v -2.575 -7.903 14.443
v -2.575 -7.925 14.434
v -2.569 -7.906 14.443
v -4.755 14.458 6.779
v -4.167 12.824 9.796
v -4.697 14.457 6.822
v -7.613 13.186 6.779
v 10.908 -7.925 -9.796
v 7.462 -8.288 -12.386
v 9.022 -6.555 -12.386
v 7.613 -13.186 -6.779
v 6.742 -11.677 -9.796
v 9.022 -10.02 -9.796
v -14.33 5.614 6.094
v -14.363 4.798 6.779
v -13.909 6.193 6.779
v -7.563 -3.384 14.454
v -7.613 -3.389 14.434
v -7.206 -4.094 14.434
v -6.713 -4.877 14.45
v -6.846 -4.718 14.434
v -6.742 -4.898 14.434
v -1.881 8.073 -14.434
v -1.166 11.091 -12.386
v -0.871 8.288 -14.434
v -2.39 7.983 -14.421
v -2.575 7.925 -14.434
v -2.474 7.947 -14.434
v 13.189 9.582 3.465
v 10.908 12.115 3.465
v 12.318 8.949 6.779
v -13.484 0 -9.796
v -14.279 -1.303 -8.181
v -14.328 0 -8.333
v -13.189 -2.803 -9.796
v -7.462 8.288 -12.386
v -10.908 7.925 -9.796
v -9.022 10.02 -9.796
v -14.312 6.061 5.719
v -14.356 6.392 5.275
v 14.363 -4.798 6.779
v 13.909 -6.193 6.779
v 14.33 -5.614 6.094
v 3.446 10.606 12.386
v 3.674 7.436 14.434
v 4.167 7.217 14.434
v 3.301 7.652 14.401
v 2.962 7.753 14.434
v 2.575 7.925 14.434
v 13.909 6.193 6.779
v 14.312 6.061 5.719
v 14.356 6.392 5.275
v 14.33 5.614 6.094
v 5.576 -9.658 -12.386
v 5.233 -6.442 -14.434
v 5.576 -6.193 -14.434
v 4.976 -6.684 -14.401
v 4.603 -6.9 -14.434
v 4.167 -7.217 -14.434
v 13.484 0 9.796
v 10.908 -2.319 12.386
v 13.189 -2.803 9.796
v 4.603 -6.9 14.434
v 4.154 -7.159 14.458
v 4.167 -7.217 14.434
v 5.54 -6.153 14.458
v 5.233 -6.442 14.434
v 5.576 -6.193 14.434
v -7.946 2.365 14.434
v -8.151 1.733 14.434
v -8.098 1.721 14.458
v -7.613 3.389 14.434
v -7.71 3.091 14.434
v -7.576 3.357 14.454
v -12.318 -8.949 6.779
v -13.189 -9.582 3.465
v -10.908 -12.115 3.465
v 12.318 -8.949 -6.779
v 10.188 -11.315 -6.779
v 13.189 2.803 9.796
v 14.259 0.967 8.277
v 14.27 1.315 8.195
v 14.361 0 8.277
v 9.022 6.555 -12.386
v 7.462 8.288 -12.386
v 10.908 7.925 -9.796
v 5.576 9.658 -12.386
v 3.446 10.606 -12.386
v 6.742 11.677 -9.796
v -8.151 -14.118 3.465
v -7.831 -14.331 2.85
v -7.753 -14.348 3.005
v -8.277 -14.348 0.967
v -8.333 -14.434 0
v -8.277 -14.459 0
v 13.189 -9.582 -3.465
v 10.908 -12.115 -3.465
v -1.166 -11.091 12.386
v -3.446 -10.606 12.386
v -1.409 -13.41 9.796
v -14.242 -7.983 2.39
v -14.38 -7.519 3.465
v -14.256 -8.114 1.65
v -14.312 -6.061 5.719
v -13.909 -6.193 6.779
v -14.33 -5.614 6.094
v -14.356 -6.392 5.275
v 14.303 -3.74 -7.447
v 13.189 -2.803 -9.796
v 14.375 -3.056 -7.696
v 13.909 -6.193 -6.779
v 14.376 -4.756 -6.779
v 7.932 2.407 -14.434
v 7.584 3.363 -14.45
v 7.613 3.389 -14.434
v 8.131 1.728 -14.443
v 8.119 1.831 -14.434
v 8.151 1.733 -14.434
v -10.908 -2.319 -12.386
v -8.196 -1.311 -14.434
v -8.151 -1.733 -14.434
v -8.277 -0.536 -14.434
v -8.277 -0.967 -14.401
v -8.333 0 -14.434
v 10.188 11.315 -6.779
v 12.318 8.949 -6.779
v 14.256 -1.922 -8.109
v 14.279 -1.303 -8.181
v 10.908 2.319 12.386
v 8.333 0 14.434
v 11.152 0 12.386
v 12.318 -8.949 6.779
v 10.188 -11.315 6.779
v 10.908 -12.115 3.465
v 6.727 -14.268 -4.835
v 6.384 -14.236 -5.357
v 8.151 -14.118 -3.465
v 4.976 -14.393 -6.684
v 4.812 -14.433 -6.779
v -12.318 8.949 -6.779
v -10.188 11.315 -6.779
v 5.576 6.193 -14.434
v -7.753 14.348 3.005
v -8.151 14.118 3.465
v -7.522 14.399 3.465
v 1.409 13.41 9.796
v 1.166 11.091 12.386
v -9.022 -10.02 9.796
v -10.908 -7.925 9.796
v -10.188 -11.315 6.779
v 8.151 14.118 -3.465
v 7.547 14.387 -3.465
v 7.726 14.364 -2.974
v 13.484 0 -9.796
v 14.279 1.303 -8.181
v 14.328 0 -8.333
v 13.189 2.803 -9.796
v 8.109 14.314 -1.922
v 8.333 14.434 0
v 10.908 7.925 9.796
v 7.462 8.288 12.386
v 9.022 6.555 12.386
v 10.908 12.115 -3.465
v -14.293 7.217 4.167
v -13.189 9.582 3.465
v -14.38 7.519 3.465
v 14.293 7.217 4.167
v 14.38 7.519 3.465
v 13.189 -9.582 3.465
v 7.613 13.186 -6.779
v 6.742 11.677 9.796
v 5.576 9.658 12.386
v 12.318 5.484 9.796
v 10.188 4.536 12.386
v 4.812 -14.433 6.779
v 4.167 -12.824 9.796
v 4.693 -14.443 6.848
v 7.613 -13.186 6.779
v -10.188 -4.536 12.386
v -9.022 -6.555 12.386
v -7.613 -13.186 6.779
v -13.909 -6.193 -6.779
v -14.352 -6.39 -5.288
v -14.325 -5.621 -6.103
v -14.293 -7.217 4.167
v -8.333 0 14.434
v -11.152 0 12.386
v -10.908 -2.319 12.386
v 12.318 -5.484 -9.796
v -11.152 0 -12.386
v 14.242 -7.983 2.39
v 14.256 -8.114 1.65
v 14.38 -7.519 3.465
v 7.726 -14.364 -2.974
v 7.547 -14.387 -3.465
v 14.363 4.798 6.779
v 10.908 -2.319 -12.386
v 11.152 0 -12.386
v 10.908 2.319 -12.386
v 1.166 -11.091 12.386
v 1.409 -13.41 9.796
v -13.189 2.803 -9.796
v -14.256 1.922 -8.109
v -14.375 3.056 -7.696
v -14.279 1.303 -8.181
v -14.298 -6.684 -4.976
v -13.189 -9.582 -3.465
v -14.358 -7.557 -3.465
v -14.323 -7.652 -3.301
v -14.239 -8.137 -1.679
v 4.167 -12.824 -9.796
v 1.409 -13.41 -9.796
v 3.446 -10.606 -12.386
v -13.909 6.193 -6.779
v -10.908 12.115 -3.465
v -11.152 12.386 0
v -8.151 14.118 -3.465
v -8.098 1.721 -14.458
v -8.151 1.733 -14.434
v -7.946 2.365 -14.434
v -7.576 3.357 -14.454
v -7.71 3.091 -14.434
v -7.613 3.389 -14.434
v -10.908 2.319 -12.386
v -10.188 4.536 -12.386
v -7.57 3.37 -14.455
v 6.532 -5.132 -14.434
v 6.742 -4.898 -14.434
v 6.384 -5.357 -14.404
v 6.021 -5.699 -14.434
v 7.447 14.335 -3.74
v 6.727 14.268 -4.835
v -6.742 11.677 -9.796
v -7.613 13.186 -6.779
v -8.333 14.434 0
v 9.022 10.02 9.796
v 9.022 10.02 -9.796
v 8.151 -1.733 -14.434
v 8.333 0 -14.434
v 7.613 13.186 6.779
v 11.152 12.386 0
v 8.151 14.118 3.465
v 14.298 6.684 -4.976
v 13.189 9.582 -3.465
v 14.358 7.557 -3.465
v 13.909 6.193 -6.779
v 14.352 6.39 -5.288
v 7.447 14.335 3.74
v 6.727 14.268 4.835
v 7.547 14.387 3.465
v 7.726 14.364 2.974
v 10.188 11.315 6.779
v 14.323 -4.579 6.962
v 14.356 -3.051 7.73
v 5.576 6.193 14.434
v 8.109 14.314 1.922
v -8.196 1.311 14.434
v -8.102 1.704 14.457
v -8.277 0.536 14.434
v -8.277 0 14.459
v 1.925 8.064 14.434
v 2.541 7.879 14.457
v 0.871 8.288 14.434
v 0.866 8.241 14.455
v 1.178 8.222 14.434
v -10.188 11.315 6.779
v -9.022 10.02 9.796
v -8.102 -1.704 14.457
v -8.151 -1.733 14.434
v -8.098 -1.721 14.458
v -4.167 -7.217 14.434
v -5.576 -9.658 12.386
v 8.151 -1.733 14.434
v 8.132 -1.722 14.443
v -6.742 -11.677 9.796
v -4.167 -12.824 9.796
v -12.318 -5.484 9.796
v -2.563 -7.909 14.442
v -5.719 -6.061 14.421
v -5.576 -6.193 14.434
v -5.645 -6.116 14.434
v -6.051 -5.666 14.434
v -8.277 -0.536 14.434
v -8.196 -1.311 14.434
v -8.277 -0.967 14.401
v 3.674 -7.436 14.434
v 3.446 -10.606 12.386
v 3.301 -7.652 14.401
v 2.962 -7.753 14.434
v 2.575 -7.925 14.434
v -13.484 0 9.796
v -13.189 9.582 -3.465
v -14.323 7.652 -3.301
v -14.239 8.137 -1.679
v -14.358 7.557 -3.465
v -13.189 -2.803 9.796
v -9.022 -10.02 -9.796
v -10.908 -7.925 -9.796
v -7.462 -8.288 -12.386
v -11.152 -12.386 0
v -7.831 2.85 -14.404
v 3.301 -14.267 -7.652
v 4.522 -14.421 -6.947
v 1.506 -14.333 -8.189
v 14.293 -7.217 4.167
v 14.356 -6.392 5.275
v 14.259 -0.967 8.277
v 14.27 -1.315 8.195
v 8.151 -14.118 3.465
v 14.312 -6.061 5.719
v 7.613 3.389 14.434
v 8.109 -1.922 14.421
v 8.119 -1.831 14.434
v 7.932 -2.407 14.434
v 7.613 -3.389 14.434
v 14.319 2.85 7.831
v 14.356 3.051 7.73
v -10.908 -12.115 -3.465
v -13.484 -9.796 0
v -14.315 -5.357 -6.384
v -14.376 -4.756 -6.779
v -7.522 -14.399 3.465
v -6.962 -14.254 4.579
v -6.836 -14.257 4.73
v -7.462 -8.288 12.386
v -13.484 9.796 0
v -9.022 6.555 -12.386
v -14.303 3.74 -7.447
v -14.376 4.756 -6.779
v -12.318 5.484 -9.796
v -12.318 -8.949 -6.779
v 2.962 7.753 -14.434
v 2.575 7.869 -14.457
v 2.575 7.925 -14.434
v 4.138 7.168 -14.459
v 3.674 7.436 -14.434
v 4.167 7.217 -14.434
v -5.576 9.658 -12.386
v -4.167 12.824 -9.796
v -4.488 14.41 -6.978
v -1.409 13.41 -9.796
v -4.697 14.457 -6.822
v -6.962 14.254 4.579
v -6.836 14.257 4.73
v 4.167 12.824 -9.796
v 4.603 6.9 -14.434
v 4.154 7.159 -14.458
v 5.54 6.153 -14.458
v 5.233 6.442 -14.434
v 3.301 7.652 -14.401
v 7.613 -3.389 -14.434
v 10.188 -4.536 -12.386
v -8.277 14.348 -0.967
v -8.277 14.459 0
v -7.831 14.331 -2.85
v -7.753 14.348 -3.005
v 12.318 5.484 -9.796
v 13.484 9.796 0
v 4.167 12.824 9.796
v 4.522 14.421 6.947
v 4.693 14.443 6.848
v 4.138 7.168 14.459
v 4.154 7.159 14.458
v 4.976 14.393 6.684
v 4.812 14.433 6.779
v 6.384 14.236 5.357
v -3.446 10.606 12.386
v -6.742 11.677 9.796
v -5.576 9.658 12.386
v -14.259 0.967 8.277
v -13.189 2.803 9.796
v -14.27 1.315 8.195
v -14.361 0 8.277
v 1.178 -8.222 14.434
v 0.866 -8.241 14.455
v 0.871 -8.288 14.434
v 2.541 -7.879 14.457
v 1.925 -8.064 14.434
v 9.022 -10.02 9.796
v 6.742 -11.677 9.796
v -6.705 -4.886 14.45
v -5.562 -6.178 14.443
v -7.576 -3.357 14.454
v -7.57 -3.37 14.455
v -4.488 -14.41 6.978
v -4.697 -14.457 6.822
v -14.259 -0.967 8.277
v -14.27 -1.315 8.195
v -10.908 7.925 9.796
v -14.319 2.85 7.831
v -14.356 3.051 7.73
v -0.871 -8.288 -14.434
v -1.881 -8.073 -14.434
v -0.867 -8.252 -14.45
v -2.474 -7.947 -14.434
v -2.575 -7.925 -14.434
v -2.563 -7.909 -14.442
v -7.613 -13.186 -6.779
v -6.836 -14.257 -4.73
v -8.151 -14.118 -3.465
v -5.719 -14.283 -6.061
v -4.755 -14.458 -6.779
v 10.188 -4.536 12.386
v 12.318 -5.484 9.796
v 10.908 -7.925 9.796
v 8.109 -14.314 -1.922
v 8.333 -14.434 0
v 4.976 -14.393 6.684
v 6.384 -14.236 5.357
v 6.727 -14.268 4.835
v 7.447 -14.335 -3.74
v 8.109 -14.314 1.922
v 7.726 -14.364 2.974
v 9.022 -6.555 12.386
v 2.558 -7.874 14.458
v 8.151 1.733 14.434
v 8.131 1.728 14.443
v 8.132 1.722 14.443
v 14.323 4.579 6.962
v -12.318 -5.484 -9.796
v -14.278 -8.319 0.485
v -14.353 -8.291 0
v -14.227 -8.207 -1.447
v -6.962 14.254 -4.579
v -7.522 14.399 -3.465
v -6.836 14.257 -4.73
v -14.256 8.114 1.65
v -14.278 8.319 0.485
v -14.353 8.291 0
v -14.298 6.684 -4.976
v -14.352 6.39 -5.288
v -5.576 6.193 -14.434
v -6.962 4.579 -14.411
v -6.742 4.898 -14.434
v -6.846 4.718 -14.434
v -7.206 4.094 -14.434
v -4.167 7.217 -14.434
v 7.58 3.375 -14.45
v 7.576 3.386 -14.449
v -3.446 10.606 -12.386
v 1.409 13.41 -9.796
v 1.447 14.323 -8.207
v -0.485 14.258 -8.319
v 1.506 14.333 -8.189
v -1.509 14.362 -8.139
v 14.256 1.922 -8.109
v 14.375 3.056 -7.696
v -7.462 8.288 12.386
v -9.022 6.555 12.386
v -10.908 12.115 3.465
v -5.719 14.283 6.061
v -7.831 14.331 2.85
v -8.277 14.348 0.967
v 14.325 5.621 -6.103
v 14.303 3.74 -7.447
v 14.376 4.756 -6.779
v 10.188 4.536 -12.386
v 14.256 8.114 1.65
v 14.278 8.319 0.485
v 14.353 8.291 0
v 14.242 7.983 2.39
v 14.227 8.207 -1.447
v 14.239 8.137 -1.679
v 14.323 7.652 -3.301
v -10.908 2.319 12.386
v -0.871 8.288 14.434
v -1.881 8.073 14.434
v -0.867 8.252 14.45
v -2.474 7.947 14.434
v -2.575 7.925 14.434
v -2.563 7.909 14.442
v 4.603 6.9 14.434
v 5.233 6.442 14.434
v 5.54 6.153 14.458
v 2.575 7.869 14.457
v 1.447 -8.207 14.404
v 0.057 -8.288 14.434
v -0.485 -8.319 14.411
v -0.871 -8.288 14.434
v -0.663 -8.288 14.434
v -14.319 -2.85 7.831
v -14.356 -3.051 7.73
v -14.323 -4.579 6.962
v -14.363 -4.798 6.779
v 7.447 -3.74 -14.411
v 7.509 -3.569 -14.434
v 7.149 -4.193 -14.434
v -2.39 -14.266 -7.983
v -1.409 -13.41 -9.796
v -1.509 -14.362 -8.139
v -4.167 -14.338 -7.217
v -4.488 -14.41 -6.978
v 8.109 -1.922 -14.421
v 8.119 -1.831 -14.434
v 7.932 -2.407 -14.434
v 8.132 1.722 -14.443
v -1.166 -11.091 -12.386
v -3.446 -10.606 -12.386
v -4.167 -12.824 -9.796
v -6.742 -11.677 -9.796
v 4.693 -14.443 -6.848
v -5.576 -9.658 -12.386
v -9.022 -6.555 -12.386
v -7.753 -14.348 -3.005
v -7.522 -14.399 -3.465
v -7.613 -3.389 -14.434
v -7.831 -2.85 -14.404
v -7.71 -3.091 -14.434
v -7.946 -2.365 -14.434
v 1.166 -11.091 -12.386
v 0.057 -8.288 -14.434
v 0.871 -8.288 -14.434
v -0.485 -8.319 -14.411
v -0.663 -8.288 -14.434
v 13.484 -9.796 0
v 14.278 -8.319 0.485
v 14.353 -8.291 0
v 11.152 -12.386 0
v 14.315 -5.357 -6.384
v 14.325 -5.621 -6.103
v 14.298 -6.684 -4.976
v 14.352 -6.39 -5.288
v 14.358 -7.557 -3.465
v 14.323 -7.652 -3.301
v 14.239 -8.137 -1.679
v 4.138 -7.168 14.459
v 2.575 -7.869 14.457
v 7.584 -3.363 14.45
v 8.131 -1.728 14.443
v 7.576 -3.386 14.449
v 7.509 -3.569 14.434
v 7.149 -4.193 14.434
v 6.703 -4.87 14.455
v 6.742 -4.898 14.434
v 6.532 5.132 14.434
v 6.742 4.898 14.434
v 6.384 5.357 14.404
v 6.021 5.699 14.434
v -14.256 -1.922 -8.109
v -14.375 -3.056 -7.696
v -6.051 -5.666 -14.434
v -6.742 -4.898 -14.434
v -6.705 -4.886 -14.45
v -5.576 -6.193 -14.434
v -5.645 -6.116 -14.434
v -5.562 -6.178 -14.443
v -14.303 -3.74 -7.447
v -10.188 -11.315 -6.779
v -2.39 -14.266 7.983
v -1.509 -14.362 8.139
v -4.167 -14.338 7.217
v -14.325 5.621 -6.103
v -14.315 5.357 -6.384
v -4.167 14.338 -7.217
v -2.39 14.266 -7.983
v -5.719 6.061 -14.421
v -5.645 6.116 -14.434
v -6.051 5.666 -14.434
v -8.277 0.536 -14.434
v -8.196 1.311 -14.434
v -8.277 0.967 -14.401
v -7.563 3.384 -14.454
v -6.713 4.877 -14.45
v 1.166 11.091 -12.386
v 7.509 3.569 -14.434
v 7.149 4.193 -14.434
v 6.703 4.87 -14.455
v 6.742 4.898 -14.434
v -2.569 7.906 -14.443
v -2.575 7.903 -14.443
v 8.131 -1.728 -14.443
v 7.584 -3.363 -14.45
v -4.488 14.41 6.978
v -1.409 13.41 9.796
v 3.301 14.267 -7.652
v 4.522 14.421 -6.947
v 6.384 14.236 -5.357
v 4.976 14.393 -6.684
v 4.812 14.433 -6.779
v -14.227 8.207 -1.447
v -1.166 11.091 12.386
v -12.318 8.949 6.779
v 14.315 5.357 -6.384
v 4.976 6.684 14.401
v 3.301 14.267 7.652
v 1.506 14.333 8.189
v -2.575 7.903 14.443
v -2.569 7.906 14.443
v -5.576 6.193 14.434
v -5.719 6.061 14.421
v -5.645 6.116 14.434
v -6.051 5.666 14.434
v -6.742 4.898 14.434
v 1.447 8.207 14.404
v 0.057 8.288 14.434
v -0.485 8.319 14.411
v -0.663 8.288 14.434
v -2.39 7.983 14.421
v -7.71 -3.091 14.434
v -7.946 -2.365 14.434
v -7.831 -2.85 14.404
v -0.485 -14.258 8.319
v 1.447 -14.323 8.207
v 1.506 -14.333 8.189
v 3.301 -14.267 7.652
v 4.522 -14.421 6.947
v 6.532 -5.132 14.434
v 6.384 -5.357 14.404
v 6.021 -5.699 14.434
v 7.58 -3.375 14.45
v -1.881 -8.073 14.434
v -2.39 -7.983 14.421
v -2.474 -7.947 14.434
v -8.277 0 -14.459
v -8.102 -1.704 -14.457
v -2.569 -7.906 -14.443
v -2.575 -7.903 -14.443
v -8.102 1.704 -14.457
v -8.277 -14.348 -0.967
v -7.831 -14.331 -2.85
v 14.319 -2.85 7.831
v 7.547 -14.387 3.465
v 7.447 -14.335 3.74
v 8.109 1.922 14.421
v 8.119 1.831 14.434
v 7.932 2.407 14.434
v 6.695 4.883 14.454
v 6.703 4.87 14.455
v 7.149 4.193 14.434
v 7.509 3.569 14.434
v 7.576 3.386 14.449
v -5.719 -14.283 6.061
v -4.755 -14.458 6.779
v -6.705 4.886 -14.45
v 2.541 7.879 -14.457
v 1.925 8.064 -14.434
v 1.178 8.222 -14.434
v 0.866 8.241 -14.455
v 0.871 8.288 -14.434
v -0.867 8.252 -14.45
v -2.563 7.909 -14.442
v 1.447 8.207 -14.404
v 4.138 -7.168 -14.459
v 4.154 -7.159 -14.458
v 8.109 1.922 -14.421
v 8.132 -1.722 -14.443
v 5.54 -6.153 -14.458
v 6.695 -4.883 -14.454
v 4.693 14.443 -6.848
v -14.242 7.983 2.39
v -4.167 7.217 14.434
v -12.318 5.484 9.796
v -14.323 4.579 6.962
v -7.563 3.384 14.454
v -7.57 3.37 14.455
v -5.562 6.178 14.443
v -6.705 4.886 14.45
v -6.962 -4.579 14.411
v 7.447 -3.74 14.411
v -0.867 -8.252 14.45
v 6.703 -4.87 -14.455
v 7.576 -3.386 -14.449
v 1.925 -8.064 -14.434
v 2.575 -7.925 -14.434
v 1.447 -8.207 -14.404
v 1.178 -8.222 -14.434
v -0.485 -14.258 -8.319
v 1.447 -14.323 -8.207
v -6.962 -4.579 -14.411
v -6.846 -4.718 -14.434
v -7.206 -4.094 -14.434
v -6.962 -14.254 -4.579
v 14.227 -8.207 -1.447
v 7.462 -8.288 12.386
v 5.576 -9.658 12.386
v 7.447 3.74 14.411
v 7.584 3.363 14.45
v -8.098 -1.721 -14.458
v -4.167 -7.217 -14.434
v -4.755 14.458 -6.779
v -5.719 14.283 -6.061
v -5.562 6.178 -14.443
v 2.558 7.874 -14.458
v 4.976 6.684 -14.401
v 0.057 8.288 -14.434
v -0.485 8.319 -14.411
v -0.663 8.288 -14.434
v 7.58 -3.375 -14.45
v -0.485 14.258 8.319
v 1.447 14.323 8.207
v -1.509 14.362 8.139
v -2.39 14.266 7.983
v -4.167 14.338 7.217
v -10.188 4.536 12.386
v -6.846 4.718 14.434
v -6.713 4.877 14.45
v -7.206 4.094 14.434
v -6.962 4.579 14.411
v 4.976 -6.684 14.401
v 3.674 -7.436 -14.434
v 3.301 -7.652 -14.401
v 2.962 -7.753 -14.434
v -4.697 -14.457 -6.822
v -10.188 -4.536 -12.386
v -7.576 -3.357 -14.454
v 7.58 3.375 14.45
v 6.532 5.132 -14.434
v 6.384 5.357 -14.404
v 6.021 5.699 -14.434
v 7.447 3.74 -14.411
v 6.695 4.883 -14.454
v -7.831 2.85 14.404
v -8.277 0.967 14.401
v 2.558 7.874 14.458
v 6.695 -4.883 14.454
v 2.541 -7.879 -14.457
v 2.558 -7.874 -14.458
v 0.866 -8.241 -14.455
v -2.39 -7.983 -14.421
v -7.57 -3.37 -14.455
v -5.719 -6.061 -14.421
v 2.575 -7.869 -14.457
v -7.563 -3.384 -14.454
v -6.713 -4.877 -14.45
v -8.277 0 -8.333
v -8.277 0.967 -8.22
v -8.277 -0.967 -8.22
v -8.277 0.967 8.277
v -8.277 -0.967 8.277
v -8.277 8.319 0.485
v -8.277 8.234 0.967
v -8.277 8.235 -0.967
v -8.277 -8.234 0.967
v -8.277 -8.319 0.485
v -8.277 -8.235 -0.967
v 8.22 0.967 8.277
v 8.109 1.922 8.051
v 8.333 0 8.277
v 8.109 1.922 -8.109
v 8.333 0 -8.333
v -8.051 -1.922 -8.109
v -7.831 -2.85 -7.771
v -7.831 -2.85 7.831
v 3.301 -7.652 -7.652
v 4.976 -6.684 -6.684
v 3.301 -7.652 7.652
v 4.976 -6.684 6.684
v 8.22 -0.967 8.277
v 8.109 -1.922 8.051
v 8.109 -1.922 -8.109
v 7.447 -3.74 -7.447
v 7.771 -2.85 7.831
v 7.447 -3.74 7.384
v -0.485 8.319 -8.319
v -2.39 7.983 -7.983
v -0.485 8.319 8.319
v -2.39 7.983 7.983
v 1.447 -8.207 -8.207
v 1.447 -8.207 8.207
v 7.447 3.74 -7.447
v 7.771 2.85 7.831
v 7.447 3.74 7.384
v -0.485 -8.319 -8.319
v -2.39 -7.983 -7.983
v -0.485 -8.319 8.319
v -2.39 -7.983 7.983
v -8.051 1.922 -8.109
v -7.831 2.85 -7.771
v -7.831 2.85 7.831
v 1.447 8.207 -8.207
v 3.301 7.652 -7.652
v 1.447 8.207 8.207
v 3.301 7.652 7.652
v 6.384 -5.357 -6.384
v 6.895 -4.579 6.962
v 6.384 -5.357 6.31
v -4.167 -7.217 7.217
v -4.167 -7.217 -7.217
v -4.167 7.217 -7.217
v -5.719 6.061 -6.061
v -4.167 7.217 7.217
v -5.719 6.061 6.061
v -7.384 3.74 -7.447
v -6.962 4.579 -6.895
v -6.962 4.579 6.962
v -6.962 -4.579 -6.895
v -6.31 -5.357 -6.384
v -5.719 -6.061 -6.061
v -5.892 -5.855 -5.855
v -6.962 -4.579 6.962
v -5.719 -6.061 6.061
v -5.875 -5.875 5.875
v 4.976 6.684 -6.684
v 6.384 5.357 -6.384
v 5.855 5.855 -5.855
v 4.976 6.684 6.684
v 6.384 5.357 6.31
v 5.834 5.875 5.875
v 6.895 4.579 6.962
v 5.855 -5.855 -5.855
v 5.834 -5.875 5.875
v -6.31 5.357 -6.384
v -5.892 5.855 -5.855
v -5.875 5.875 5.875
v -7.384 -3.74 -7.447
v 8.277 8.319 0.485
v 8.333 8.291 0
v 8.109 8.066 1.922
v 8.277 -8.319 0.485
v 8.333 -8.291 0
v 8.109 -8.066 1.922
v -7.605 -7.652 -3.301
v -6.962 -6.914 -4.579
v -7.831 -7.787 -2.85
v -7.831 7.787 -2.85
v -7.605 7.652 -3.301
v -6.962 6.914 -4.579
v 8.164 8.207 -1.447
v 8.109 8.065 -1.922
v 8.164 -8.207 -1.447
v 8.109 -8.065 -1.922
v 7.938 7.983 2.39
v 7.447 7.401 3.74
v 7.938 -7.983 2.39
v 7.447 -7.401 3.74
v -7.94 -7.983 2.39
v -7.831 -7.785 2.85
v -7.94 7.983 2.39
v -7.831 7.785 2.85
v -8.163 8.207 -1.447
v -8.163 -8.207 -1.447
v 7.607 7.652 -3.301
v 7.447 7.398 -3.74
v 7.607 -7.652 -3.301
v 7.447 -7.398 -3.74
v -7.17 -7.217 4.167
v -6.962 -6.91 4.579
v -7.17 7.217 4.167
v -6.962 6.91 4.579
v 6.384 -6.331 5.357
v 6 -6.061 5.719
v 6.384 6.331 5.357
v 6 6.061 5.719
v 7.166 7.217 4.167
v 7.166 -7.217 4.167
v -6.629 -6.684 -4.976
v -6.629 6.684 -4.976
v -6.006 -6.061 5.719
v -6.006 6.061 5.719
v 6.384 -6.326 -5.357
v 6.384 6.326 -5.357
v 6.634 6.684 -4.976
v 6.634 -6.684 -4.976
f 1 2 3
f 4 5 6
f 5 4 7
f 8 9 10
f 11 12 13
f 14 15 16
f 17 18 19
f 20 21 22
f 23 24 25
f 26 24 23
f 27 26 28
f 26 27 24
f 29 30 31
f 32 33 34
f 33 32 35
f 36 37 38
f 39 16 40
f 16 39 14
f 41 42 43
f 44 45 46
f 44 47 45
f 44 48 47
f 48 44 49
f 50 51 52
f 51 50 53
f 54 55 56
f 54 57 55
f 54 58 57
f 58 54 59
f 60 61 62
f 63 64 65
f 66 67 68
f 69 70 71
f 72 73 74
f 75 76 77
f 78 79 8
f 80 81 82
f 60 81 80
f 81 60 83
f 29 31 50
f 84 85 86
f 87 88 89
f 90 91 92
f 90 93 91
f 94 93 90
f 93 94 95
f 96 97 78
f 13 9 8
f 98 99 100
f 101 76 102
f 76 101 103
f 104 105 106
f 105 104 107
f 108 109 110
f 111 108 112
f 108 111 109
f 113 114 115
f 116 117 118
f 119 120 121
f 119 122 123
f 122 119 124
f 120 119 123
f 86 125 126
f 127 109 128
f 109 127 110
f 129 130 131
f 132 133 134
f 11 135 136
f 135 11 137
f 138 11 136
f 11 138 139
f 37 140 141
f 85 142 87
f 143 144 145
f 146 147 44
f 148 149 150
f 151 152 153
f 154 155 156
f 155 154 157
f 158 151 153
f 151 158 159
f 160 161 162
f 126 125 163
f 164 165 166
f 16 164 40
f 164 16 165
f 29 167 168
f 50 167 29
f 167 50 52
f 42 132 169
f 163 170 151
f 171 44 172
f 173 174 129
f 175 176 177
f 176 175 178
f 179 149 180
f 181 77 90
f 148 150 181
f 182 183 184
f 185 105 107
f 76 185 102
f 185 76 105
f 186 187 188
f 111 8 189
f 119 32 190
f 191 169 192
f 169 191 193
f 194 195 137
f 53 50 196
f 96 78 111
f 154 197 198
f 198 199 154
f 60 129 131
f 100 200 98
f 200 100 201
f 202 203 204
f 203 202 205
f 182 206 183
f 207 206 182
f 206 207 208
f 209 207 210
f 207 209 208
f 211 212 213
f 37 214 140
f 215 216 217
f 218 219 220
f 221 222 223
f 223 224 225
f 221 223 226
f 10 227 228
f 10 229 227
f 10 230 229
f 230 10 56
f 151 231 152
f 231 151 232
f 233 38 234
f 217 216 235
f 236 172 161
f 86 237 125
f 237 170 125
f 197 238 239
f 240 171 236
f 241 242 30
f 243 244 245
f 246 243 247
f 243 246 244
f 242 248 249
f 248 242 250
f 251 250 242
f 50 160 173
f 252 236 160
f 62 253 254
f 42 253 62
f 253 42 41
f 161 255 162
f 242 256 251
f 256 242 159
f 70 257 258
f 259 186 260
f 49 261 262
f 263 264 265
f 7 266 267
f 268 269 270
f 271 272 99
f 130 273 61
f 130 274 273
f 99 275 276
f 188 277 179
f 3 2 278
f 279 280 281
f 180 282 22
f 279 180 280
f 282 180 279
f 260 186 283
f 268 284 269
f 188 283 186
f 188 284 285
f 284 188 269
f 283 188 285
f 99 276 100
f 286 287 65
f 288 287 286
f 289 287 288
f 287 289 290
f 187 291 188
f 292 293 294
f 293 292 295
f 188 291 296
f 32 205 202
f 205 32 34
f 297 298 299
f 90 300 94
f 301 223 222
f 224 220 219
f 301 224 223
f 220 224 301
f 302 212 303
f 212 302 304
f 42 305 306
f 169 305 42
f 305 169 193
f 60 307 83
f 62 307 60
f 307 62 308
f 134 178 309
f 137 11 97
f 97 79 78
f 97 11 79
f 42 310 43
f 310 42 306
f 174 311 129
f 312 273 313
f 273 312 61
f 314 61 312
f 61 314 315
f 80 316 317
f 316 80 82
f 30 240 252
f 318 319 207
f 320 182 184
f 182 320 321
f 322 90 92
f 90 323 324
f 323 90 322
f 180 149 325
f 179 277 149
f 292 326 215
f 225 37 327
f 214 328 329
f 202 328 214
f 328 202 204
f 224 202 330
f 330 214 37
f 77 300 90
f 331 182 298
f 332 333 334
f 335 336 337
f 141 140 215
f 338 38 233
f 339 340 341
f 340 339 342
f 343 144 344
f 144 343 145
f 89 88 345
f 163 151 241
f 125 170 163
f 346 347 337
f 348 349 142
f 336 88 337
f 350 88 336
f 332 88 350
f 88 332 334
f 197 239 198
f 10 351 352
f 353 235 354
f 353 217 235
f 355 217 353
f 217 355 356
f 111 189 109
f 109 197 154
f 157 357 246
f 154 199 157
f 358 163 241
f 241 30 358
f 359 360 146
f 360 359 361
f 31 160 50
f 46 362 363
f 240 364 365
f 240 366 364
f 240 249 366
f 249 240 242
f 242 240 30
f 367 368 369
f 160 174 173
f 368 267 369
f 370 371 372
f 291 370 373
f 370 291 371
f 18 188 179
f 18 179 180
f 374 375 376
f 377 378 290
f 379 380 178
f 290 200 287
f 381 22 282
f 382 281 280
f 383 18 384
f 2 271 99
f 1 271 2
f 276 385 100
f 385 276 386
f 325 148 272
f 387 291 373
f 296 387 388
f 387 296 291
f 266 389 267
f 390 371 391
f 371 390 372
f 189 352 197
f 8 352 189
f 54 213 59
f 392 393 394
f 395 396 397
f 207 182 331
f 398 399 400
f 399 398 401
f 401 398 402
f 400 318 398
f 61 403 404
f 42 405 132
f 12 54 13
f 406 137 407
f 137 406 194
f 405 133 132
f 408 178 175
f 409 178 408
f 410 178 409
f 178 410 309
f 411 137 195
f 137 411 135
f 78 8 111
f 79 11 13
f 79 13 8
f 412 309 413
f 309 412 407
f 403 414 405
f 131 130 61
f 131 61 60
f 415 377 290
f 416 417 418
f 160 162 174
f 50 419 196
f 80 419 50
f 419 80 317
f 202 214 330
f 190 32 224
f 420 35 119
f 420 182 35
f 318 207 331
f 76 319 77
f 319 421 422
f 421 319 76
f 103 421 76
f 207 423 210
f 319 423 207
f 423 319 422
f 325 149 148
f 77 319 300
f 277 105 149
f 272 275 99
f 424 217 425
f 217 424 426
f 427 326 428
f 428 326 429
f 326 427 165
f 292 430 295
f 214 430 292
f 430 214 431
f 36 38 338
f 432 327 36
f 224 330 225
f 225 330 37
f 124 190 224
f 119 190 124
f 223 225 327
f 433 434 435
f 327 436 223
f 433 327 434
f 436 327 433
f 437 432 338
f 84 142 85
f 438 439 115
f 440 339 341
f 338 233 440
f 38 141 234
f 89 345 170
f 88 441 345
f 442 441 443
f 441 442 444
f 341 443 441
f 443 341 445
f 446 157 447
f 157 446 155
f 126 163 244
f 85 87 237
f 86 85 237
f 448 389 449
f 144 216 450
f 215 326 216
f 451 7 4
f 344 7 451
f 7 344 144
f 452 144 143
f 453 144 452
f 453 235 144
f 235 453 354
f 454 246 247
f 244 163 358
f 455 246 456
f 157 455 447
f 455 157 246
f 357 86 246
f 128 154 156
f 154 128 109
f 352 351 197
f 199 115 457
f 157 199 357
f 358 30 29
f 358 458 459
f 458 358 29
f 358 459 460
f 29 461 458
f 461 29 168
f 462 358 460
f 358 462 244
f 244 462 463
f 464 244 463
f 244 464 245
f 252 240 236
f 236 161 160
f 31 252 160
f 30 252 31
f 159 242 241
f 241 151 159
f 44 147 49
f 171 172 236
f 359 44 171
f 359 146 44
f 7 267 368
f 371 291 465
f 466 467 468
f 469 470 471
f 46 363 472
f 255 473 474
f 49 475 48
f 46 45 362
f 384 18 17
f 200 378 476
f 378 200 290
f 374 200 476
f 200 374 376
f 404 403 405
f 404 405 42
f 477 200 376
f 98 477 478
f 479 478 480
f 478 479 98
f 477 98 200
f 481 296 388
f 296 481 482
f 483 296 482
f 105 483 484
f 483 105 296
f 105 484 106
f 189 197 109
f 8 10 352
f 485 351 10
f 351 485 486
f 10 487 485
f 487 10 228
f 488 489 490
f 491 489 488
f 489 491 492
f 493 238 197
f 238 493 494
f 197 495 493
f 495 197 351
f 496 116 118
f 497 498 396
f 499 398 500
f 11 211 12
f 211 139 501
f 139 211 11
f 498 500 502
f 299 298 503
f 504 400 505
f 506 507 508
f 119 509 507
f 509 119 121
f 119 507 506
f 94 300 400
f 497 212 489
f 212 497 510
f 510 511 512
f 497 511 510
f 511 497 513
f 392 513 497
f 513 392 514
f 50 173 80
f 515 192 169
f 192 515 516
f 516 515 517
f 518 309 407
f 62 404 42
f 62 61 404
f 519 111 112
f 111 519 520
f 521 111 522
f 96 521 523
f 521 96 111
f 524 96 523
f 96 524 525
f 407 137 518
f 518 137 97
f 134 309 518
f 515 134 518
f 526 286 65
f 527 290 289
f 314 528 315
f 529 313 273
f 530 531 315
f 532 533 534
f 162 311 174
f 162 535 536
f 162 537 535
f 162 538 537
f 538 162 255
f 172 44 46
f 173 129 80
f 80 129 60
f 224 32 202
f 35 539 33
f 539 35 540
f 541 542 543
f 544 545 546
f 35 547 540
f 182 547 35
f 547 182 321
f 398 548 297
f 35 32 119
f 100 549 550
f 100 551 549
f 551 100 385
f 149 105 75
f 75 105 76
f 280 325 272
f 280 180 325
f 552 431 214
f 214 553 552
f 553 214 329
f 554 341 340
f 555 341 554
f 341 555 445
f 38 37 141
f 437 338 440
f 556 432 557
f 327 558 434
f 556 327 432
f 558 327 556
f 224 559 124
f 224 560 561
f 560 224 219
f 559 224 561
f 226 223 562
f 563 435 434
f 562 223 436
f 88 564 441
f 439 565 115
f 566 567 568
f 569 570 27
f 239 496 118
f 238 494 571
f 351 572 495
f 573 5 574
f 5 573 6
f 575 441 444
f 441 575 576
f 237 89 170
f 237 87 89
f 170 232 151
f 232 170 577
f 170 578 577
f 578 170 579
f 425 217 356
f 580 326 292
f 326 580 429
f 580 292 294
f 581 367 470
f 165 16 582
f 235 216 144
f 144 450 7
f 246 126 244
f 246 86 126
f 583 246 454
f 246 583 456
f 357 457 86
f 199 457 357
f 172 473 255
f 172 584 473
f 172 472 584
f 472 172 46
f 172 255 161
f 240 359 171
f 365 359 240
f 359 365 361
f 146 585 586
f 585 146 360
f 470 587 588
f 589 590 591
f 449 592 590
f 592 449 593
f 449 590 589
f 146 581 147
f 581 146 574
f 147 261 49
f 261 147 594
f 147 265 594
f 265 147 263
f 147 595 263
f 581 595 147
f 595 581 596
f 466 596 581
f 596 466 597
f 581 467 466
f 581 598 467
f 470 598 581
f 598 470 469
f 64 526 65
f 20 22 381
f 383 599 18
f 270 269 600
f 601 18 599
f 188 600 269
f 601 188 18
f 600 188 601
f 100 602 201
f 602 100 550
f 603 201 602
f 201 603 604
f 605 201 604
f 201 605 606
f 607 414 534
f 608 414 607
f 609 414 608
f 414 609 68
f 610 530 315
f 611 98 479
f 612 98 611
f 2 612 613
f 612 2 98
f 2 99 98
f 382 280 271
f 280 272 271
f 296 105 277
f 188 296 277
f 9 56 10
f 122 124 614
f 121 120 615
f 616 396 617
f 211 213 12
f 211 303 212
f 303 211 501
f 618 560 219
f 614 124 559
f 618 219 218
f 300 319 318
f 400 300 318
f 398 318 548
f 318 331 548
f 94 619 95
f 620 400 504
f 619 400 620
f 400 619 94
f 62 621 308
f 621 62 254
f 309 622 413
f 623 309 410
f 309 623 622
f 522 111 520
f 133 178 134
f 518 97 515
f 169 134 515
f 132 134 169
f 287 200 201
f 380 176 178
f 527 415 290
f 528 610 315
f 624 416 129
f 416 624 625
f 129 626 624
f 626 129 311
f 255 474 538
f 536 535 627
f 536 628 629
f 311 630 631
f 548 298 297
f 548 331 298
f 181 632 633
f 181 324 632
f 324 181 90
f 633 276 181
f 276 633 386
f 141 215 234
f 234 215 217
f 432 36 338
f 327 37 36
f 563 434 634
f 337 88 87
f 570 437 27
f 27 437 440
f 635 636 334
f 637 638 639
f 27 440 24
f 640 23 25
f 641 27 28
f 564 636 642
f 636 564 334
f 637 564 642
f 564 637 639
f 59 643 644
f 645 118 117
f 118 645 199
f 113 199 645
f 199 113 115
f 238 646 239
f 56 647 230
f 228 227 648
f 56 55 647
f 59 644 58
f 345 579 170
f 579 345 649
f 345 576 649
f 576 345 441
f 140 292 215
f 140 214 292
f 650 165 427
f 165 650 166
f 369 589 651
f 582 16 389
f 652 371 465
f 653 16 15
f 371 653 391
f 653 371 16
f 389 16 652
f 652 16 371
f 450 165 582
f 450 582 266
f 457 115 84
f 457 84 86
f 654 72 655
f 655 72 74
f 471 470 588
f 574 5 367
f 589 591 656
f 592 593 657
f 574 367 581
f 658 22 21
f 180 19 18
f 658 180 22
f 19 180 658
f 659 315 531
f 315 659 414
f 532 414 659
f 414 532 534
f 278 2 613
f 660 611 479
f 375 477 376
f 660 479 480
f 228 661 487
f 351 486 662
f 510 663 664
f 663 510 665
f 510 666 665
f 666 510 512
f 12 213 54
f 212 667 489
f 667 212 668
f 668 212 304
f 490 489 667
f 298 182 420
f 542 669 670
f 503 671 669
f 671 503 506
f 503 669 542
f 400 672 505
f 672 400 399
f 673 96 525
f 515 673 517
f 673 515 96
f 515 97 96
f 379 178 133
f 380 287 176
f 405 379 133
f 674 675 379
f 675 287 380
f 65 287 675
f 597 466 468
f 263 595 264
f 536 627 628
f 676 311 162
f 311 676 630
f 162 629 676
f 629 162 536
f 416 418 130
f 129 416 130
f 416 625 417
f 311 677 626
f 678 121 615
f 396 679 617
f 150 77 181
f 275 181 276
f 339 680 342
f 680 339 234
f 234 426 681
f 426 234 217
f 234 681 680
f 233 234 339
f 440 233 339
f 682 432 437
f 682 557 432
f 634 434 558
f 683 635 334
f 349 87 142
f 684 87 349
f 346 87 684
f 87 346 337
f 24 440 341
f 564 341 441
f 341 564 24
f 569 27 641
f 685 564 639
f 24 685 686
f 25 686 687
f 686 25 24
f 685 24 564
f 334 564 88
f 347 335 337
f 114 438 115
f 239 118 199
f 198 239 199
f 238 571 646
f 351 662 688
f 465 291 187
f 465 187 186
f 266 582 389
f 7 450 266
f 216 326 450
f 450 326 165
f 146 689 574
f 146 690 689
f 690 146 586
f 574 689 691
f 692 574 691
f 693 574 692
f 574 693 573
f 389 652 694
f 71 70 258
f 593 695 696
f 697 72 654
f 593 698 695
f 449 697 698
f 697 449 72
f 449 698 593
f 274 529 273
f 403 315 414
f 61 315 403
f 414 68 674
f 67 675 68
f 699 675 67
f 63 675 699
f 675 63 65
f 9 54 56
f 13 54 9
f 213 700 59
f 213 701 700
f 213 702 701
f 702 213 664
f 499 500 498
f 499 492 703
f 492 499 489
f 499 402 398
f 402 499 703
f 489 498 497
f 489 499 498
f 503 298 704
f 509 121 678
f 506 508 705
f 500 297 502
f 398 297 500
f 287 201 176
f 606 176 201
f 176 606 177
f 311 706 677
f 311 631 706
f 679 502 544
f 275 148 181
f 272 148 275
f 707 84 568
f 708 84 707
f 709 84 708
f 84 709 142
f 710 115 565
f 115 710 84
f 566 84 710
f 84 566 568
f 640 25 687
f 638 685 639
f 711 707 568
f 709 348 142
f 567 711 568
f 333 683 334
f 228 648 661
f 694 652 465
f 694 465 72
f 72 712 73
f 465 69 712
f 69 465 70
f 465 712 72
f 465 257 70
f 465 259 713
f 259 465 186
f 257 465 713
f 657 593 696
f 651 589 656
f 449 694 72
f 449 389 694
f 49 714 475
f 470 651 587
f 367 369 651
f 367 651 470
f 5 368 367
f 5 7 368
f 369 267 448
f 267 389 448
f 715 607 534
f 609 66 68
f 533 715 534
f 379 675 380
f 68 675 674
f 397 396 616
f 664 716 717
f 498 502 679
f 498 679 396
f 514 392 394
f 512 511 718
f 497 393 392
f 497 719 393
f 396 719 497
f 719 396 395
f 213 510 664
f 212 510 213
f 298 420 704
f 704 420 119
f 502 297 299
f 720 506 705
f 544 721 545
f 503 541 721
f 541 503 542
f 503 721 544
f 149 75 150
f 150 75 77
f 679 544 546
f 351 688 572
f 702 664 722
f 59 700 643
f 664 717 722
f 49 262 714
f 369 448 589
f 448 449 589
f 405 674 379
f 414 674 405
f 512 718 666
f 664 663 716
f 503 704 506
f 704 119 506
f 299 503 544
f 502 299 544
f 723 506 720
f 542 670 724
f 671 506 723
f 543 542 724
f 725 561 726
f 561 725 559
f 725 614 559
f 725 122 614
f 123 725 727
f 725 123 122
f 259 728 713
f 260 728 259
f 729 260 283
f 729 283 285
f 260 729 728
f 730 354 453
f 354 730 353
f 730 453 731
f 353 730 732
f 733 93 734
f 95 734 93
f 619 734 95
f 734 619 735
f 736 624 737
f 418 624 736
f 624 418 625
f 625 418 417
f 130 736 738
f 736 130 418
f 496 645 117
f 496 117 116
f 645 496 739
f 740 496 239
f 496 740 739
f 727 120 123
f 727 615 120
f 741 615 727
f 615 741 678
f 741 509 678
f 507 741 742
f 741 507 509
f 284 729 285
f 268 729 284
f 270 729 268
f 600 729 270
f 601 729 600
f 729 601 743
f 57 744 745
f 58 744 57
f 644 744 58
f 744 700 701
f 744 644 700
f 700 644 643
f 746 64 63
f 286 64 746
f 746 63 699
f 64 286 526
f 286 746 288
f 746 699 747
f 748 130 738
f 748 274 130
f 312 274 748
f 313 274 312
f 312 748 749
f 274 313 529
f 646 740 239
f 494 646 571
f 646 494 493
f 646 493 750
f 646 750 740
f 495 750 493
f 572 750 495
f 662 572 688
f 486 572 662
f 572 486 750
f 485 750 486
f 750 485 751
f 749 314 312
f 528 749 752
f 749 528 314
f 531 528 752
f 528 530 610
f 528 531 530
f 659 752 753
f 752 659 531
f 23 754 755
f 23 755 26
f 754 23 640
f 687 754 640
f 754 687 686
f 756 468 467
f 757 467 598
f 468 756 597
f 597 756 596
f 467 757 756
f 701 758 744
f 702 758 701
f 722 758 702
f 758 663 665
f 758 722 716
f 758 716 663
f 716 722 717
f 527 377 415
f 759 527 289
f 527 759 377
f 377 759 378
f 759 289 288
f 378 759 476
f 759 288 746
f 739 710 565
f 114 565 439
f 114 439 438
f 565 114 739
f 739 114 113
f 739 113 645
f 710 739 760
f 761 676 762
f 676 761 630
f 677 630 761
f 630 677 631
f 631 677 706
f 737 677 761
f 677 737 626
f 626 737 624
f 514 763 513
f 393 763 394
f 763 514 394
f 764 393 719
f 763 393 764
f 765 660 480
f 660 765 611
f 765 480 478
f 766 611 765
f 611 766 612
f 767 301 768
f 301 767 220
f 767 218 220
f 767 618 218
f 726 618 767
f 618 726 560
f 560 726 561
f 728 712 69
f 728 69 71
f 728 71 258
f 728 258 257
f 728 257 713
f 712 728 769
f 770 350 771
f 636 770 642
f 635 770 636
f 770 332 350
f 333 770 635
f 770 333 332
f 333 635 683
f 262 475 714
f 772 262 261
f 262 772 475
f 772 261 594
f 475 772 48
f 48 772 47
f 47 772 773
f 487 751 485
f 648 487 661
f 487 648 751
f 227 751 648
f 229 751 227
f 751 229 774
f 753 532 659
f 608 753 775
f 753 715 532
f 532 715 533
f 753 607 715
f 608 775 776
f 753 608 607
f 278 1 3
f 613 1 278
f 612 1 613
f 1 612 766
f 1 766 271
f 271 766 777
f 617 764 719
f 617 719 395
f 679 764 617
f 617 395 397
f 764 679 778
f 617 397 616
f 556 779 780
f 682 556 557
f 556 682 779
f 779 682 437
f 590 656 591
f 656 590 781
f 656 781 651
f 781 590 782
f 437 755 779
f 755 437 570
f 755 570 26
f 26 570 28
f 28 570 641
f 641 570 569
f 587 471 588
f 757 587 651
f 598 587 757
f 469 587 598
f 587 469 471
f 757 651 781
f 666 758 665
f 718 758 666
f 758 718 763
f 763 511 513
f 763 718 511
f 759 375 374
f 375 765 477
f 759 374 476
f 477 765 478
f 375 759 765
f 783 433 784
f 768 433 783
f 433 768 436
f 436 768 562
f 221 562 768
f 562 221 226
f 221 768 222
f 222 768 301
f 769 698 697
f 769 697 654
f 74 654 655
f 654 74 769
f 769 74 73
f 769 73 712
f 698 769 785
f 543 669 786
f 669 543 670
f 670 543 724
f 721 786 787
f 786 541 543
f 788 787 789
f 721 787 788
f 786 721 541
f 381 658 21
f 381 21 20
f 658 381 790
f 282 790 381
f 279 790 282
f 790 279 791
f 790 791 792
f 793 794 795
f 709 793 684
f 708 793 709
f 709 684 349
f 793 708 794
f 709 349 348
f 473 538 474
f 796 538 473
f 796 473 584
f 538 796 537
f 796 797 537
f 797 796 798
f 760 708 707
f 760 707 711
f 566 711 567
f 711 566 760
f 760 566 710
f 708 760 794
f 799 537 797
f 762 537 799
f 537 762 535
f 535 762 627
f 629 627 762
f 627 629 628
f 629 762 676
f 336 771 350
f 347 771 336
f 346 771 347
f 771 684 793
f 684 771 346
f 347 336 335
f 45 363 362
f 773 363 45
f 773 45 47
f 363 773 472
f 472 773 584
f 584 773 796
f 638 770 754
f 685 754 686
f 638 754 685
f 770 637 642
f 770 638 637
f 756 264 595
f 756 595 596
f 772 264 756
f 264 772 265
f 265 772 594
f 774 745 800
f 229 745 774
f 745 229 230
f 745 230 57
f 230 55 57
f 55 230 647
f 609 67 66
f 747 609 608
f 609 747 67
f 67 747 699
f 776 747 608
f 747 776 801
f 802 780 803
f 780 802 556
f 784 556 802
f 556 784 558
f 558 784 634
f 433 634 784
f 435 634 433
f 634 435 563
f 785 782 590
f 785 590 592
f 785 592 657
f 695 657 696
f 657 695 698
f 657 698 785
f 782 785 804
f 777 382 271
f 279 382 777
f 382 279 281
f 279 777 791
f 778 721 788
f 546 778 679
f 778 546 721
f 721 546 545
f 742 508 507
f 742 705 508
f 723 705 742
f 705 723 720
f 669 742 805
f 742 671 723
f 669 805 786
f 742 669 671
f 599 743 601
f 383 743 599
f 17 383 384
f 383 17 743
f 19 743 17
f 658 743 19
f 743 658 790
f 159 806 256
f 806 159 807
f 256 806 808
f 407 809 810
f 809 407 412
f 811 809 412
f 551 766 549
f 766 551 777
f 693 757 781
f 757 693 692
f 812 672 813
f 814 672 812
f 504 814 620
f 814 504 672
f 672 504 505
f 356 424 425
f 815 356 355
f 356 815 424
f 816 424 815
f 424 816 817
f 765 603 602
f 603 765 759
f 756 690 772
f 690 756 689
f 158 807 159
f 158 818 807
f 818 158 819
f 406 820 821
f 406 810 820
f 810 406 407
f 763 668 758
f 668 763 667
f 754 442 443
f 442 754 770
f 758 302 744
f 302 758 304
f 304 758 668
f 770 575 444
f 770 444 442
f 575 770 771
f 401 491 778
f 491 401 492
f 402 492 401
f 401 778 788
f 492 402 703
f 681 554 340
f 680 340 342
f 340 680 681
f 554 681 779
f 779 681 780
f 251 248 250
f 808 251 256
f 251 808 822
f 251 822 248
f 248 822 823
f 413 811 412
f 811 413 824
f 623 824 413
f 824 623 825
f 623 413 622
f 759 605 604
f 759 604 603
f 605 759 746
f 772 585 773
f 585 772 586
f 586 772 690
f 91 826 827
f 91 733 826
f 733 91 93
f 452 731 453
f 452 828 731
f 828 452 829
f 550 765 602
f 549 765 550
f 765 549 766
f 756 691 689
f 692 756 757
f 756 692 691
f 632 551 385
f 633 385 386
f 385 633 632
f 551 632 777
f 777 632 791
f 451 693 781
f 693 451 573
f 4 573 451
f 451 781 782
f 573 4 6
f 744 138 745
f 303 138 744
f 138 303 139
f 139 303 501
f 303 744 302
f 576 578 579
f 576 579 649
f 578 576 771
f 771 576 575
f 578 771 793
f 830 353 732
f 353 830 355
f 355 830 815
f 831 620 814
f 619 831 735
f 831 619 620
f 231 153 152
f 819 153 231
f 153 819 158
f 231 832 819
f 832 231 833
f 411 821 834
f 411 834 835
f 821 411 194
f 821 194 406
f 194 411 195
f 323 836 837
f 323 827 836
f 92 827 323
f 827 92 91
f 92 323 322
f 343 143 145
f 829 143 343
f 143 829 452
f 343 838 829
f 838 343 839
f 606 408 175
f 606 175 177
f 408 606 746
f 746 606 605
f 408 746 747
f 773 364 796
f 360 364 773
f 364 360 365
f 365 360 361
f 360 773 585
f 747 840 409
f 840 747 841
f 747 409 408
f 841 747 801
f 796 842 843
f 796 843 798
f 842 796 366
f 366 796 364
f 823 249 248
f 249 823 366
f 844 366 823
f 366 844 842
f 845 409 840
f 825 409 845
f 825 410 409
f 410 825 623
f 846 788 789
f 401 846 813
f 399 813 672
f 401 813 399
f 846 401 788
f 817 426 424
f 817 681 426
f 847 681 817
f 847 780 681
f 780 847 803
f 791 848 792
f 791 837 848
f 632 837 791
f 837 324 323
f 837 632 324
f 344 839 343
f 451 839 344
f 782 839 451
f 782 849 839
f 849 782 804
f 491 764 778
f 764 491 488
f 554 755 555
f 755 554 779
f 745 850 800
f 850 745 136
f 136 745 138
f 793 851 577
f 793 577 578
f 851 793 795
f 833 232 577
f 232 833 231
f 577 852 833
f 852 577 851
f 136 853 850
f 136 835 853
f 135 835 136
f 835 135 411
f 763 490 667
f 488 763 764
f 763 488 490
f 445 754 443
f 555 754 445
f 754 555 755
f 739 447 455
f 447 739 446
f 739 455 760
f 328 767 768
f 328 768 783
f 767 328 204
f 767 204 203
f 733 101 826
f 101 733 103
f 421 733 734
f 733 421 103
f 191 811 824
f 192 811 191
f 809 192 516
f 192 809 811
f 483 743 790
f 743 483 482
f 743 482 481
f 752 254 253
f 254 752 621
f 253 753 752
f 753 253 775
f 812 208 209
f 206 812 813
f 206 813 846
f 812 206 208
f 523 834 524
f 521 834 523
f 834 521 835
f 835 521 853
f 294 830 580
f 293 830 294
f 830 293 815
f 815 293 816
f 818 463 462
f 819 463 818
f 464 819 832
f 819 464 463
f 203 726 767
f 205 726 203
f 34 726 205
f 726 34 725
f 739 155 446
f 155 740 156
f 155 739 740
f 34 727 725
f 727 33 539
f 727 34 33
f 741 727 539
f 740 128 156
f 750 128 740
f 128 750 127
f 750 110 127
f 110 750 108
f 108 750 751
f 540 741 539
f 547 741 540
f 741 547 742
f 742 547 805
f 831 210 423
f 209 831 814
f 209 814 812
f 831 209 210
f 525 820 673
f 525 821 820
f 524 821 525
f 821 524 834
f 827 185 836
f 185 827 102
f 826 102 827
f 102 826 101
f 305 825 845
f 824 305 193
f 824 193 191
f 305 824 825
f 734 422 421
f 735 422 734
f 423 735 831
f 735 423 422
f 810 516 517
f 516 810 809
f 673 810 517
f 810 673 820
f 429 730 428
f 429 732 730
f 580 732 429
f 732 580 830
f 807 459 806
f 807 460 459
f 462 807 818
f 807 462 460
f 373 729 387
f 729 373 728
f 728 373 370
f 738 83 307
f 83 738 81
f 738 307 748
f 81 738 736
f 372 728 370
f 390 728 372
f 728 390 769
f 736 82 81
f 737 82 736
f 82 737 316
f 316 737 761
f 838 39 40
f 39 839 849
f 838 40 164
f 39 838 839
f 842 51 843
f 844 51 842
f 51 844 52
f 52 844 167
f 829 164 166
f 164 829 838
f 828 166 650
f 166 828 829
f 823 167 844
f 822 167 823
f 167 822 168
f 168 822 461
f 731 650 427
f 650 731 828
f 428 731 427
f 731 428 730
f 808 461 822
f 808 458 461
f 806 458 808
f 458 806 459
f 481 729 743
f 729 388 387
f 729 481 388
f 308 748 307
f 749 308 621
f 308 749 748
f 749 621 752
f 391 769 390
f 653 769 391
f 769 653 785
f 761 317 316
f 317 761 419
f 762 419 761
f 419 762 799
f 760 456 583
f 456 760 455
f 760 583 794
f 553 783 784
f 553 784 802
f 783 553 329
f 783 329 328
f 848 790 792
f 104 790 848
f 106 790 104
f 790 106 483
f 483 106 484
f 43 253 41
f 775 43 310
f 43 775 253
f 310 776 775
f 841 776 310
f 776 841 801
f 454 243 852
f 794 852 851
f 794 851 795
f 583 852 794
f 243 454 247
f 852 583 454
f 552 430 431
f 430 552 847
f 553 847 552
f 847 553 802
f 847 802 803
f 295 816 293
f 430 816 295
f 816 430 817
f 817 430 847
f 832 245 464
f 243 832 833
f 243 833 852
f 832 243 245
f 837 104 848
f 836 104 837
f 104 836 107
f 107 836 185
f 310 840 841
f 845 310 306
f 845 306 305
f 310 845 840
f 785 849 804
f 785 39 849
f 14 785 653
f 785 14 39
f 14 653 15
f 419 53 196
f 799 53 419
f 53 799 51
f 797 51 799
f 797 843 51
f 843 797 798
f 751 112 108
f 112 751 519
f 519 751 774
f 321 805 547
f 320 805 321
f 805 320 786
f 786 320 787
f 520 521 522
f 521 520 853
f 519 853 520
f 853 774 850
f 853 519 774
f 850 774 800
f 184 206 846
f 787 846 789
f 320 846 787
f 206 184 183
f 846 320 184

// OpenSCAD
module example001()
{
	function r_from_dia(d) = d / 3;

	module rotcy(rot, r, h) {
		rotate(90, rot)
			cylinder(r = r, h = h, center = true);
	}

	difference() {
		sphere(r = r_from_dia(size));
		rotcy([0, 0, 0], cy_r, cy_h);
		rotcy([1, 0, 0], cy_r, cy_h);
		rotcy([0, 1, 0], cy_r, cy_h);
	}

	size = 50;
	hole = 25;

	cy_r = r_from_dia(hole);
	cy_h = r_from_dia(size * 2.5);
}

example001();
